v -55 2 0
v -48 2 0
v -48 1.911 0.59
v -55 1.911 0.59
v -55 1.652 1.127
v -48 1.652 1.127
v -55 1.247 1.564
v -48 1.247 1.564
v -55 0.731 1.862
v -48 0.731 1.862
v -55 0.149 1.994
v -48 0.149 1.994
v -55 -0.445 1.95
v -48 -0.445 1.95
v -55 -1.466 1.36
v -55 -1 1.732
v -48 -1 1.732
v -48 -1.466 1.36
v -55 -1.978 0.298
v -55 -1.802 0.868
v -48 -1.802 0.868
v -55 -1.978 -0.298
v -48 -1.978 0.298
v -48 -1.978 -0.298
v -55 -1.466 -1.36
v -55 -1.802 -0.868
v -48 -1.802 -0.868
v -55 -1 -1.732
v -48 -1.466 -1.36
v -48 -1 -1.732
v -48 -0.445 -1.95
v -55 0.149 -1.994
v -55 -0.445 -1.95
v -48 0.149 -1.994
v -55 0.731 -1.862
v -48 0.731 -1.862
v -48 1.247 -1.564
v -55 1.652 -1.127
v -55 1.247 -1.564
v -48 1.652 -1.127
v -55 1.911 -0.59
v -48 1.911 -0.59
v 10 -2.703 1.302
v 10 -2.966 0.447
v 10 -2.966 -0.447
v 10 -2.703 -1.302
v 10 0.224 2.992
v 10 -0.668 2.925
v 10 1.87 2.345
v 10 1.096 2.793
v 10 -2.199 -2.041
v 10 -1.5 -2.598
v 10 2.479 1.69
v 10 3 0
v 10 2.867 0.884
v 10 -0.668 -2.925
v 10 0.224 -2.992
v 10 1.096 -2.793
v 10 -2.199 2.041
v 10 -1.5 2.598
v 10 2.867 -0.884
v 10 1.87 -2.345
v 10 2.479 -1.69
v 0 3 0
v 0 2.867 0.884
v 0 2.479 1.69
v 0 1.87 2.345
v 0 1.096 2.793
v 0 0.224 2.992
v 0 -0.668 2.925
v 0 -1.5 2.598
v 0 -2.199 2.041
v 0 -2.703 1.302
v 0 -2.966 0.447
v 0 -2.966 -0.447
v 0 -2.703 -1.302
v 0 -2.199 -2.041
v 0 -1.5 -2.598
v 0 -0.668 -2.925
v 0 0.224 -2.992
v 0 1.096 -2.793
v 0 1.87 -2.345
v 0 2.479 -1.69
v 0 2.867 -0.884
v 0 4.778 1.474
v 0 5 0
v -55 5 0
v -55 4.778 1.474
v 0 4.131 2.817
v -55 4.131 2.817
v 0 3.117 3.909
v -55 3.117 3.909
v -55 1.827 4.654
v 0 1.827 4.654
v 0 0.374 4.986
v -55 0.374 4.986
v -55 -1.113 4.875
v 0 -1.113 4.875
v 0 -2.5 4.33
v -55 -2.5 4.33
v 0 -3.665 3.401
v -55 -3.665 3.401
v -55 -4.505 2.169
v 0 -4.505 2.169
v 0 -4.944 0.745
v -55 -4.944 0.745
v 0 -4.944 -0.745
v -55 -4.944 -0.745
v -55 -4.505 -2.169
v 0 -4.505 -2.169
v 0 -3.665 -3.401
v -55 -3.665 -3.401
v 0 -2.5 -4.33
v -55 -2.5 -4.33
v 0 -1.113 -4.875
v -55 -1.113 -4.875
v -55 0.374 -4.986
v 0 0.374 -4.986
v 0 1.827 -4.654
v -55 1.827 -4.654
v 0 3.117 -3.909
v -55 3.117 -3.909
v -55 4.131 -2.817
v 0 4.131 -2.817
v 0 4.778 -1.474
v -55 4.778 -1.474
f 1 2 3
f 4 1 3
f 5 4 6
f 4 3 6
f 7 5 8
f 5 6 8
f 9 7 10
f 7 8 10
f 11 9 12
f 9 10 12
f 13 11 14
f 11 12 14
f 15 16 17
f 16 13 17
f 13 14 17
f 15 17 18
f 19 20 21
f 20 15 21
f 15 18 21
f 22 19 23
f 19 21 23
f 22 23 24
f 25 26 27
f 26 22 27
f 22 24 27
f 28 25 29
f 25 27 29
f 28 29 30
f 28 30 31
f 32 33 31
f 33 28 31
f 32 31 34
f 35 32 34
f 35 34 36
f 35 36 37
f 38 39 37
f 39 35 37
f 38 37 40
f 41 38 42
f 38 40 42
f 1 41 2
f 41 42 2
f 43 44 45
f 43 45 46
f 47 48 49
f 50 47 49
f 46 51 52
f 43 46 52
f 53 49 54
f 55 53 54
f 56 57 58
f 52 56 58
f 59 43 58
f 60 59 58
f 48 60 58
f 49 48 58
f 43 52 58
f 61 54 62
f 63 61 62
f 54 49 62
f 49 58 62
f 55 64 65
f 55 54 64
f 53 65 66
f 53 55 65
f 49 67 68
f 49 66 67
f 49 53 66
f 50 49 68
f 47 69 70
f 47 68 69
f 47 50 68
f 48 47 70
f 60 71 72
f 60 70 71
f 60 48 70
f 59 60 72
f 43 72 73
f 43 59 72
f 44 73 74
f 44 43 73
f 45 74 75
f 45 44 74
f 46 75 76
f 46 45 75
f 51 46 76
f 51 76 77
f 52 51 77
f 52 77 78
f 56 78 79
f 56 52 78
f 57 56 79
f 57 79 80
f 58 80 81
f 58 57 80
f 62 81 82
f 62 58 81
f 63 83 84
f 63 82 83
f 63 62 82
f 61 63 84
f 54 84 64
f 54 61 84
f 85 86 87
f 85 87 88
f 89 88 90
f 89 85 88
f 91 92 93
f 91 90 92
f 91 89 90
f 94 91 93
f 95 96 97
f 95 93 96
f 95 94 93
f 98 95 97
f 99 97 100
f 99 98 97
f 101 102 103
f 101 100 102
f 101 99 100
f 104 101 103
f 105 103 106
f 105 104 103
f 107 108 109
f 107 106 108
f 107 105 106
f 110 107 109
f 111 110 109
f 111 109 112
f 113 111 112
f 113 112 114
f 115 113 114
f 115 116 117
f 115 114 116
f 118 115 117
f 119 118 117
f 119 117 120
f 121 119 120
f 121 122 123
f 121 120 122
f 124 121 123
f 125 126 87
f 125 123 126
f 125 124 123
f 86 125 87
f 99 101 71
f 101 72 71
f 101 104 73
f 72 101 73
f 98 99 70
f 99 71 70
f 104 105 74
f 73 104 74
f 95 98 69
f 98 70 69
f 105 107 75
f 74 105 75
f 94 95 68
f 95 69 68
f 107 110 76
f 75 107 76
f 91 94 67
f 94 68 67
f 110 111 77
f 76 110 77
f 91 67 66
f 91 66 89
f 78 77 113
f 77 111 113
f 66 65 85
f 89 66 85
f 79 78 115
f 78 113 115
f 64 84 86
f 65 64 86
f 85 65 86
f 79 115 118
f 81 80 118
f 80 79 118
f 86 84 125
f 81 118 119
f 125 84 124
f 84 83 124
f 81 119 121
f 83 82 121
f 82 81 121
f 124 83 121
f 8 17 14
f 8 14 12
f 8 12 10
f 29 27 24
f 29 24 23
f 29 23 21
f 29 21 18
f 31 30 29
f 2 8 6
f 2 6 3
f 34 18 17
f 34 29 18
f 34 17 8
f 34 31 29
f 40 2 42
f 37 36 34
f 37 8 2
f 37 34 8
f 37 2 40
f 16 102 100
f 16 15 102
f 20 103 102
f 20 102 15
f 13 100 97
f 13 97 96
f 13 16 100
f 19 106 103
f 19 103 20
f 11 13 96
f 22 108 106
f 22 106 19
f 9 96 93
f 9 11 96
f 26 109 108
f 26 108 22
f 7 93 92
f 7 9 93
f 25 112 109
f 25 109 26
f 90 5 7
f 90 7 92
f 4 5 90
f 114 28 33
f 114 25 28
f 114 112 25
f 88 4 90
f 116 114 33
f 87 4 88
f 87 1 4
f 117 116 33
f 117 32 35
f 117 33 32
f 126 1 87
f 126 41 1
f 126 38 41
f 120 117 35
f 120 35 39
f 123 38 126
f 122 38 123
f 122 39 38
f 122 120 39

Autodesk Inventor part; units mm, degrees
ref_plane "YZ Plane" through (0, 0, 0) normal (1, 0, 0) x (0, 1, 0)
ref_plane "XZ Plane" through (0, 0, 0) normal (0, 1, 0) x (-1, 0, 0)
ref_plane "XY Plane" through (0, 0, 0) normal (0, 0, 1) x (1, 0, 0)
sketch "Skizze1" plane through (0, 0, 0) normal (0, 0, 1) x (1, 0, 0)
  line L0 (10, 0) -> (-48, 0)
  line L1 (-55, 5) -> (0, 5)
  line L2 (0, 5) -> (0, 3)
  line L3 (0, 3) -> (10, 3)
  line L4 (10, 3) -> (10, 0)
  line L5 (-55, 5) -> (-55, 2)
  line L6 (-55, 2) -> (-48, 2)
  line L7 (-48, 2) -> (-48, 0)
  point P0 (0, 0)
  point P1 (0, 4)
  dimension "d0" = 10
  dimension "d2" = 10
  dimension "d3" = 6
  dimension "d8" = 55
  dimension "d9" = 4
  dimension "d12" = 7
revolve "Umdrehung1" add sketch "Skizze1" angle 360 about axis through (10, 0, 0) along (-1, 0, 0)
thread "Gewinde2" size "M6x1" class "6g" standard "ANSI Metric M Profile" length 28
thread "Gewinde3" size "M4x0.7" class "6H" standard "ANSI Metric M Profile" full length
properties part number "Bolzen" material "Eisen, Grau"
